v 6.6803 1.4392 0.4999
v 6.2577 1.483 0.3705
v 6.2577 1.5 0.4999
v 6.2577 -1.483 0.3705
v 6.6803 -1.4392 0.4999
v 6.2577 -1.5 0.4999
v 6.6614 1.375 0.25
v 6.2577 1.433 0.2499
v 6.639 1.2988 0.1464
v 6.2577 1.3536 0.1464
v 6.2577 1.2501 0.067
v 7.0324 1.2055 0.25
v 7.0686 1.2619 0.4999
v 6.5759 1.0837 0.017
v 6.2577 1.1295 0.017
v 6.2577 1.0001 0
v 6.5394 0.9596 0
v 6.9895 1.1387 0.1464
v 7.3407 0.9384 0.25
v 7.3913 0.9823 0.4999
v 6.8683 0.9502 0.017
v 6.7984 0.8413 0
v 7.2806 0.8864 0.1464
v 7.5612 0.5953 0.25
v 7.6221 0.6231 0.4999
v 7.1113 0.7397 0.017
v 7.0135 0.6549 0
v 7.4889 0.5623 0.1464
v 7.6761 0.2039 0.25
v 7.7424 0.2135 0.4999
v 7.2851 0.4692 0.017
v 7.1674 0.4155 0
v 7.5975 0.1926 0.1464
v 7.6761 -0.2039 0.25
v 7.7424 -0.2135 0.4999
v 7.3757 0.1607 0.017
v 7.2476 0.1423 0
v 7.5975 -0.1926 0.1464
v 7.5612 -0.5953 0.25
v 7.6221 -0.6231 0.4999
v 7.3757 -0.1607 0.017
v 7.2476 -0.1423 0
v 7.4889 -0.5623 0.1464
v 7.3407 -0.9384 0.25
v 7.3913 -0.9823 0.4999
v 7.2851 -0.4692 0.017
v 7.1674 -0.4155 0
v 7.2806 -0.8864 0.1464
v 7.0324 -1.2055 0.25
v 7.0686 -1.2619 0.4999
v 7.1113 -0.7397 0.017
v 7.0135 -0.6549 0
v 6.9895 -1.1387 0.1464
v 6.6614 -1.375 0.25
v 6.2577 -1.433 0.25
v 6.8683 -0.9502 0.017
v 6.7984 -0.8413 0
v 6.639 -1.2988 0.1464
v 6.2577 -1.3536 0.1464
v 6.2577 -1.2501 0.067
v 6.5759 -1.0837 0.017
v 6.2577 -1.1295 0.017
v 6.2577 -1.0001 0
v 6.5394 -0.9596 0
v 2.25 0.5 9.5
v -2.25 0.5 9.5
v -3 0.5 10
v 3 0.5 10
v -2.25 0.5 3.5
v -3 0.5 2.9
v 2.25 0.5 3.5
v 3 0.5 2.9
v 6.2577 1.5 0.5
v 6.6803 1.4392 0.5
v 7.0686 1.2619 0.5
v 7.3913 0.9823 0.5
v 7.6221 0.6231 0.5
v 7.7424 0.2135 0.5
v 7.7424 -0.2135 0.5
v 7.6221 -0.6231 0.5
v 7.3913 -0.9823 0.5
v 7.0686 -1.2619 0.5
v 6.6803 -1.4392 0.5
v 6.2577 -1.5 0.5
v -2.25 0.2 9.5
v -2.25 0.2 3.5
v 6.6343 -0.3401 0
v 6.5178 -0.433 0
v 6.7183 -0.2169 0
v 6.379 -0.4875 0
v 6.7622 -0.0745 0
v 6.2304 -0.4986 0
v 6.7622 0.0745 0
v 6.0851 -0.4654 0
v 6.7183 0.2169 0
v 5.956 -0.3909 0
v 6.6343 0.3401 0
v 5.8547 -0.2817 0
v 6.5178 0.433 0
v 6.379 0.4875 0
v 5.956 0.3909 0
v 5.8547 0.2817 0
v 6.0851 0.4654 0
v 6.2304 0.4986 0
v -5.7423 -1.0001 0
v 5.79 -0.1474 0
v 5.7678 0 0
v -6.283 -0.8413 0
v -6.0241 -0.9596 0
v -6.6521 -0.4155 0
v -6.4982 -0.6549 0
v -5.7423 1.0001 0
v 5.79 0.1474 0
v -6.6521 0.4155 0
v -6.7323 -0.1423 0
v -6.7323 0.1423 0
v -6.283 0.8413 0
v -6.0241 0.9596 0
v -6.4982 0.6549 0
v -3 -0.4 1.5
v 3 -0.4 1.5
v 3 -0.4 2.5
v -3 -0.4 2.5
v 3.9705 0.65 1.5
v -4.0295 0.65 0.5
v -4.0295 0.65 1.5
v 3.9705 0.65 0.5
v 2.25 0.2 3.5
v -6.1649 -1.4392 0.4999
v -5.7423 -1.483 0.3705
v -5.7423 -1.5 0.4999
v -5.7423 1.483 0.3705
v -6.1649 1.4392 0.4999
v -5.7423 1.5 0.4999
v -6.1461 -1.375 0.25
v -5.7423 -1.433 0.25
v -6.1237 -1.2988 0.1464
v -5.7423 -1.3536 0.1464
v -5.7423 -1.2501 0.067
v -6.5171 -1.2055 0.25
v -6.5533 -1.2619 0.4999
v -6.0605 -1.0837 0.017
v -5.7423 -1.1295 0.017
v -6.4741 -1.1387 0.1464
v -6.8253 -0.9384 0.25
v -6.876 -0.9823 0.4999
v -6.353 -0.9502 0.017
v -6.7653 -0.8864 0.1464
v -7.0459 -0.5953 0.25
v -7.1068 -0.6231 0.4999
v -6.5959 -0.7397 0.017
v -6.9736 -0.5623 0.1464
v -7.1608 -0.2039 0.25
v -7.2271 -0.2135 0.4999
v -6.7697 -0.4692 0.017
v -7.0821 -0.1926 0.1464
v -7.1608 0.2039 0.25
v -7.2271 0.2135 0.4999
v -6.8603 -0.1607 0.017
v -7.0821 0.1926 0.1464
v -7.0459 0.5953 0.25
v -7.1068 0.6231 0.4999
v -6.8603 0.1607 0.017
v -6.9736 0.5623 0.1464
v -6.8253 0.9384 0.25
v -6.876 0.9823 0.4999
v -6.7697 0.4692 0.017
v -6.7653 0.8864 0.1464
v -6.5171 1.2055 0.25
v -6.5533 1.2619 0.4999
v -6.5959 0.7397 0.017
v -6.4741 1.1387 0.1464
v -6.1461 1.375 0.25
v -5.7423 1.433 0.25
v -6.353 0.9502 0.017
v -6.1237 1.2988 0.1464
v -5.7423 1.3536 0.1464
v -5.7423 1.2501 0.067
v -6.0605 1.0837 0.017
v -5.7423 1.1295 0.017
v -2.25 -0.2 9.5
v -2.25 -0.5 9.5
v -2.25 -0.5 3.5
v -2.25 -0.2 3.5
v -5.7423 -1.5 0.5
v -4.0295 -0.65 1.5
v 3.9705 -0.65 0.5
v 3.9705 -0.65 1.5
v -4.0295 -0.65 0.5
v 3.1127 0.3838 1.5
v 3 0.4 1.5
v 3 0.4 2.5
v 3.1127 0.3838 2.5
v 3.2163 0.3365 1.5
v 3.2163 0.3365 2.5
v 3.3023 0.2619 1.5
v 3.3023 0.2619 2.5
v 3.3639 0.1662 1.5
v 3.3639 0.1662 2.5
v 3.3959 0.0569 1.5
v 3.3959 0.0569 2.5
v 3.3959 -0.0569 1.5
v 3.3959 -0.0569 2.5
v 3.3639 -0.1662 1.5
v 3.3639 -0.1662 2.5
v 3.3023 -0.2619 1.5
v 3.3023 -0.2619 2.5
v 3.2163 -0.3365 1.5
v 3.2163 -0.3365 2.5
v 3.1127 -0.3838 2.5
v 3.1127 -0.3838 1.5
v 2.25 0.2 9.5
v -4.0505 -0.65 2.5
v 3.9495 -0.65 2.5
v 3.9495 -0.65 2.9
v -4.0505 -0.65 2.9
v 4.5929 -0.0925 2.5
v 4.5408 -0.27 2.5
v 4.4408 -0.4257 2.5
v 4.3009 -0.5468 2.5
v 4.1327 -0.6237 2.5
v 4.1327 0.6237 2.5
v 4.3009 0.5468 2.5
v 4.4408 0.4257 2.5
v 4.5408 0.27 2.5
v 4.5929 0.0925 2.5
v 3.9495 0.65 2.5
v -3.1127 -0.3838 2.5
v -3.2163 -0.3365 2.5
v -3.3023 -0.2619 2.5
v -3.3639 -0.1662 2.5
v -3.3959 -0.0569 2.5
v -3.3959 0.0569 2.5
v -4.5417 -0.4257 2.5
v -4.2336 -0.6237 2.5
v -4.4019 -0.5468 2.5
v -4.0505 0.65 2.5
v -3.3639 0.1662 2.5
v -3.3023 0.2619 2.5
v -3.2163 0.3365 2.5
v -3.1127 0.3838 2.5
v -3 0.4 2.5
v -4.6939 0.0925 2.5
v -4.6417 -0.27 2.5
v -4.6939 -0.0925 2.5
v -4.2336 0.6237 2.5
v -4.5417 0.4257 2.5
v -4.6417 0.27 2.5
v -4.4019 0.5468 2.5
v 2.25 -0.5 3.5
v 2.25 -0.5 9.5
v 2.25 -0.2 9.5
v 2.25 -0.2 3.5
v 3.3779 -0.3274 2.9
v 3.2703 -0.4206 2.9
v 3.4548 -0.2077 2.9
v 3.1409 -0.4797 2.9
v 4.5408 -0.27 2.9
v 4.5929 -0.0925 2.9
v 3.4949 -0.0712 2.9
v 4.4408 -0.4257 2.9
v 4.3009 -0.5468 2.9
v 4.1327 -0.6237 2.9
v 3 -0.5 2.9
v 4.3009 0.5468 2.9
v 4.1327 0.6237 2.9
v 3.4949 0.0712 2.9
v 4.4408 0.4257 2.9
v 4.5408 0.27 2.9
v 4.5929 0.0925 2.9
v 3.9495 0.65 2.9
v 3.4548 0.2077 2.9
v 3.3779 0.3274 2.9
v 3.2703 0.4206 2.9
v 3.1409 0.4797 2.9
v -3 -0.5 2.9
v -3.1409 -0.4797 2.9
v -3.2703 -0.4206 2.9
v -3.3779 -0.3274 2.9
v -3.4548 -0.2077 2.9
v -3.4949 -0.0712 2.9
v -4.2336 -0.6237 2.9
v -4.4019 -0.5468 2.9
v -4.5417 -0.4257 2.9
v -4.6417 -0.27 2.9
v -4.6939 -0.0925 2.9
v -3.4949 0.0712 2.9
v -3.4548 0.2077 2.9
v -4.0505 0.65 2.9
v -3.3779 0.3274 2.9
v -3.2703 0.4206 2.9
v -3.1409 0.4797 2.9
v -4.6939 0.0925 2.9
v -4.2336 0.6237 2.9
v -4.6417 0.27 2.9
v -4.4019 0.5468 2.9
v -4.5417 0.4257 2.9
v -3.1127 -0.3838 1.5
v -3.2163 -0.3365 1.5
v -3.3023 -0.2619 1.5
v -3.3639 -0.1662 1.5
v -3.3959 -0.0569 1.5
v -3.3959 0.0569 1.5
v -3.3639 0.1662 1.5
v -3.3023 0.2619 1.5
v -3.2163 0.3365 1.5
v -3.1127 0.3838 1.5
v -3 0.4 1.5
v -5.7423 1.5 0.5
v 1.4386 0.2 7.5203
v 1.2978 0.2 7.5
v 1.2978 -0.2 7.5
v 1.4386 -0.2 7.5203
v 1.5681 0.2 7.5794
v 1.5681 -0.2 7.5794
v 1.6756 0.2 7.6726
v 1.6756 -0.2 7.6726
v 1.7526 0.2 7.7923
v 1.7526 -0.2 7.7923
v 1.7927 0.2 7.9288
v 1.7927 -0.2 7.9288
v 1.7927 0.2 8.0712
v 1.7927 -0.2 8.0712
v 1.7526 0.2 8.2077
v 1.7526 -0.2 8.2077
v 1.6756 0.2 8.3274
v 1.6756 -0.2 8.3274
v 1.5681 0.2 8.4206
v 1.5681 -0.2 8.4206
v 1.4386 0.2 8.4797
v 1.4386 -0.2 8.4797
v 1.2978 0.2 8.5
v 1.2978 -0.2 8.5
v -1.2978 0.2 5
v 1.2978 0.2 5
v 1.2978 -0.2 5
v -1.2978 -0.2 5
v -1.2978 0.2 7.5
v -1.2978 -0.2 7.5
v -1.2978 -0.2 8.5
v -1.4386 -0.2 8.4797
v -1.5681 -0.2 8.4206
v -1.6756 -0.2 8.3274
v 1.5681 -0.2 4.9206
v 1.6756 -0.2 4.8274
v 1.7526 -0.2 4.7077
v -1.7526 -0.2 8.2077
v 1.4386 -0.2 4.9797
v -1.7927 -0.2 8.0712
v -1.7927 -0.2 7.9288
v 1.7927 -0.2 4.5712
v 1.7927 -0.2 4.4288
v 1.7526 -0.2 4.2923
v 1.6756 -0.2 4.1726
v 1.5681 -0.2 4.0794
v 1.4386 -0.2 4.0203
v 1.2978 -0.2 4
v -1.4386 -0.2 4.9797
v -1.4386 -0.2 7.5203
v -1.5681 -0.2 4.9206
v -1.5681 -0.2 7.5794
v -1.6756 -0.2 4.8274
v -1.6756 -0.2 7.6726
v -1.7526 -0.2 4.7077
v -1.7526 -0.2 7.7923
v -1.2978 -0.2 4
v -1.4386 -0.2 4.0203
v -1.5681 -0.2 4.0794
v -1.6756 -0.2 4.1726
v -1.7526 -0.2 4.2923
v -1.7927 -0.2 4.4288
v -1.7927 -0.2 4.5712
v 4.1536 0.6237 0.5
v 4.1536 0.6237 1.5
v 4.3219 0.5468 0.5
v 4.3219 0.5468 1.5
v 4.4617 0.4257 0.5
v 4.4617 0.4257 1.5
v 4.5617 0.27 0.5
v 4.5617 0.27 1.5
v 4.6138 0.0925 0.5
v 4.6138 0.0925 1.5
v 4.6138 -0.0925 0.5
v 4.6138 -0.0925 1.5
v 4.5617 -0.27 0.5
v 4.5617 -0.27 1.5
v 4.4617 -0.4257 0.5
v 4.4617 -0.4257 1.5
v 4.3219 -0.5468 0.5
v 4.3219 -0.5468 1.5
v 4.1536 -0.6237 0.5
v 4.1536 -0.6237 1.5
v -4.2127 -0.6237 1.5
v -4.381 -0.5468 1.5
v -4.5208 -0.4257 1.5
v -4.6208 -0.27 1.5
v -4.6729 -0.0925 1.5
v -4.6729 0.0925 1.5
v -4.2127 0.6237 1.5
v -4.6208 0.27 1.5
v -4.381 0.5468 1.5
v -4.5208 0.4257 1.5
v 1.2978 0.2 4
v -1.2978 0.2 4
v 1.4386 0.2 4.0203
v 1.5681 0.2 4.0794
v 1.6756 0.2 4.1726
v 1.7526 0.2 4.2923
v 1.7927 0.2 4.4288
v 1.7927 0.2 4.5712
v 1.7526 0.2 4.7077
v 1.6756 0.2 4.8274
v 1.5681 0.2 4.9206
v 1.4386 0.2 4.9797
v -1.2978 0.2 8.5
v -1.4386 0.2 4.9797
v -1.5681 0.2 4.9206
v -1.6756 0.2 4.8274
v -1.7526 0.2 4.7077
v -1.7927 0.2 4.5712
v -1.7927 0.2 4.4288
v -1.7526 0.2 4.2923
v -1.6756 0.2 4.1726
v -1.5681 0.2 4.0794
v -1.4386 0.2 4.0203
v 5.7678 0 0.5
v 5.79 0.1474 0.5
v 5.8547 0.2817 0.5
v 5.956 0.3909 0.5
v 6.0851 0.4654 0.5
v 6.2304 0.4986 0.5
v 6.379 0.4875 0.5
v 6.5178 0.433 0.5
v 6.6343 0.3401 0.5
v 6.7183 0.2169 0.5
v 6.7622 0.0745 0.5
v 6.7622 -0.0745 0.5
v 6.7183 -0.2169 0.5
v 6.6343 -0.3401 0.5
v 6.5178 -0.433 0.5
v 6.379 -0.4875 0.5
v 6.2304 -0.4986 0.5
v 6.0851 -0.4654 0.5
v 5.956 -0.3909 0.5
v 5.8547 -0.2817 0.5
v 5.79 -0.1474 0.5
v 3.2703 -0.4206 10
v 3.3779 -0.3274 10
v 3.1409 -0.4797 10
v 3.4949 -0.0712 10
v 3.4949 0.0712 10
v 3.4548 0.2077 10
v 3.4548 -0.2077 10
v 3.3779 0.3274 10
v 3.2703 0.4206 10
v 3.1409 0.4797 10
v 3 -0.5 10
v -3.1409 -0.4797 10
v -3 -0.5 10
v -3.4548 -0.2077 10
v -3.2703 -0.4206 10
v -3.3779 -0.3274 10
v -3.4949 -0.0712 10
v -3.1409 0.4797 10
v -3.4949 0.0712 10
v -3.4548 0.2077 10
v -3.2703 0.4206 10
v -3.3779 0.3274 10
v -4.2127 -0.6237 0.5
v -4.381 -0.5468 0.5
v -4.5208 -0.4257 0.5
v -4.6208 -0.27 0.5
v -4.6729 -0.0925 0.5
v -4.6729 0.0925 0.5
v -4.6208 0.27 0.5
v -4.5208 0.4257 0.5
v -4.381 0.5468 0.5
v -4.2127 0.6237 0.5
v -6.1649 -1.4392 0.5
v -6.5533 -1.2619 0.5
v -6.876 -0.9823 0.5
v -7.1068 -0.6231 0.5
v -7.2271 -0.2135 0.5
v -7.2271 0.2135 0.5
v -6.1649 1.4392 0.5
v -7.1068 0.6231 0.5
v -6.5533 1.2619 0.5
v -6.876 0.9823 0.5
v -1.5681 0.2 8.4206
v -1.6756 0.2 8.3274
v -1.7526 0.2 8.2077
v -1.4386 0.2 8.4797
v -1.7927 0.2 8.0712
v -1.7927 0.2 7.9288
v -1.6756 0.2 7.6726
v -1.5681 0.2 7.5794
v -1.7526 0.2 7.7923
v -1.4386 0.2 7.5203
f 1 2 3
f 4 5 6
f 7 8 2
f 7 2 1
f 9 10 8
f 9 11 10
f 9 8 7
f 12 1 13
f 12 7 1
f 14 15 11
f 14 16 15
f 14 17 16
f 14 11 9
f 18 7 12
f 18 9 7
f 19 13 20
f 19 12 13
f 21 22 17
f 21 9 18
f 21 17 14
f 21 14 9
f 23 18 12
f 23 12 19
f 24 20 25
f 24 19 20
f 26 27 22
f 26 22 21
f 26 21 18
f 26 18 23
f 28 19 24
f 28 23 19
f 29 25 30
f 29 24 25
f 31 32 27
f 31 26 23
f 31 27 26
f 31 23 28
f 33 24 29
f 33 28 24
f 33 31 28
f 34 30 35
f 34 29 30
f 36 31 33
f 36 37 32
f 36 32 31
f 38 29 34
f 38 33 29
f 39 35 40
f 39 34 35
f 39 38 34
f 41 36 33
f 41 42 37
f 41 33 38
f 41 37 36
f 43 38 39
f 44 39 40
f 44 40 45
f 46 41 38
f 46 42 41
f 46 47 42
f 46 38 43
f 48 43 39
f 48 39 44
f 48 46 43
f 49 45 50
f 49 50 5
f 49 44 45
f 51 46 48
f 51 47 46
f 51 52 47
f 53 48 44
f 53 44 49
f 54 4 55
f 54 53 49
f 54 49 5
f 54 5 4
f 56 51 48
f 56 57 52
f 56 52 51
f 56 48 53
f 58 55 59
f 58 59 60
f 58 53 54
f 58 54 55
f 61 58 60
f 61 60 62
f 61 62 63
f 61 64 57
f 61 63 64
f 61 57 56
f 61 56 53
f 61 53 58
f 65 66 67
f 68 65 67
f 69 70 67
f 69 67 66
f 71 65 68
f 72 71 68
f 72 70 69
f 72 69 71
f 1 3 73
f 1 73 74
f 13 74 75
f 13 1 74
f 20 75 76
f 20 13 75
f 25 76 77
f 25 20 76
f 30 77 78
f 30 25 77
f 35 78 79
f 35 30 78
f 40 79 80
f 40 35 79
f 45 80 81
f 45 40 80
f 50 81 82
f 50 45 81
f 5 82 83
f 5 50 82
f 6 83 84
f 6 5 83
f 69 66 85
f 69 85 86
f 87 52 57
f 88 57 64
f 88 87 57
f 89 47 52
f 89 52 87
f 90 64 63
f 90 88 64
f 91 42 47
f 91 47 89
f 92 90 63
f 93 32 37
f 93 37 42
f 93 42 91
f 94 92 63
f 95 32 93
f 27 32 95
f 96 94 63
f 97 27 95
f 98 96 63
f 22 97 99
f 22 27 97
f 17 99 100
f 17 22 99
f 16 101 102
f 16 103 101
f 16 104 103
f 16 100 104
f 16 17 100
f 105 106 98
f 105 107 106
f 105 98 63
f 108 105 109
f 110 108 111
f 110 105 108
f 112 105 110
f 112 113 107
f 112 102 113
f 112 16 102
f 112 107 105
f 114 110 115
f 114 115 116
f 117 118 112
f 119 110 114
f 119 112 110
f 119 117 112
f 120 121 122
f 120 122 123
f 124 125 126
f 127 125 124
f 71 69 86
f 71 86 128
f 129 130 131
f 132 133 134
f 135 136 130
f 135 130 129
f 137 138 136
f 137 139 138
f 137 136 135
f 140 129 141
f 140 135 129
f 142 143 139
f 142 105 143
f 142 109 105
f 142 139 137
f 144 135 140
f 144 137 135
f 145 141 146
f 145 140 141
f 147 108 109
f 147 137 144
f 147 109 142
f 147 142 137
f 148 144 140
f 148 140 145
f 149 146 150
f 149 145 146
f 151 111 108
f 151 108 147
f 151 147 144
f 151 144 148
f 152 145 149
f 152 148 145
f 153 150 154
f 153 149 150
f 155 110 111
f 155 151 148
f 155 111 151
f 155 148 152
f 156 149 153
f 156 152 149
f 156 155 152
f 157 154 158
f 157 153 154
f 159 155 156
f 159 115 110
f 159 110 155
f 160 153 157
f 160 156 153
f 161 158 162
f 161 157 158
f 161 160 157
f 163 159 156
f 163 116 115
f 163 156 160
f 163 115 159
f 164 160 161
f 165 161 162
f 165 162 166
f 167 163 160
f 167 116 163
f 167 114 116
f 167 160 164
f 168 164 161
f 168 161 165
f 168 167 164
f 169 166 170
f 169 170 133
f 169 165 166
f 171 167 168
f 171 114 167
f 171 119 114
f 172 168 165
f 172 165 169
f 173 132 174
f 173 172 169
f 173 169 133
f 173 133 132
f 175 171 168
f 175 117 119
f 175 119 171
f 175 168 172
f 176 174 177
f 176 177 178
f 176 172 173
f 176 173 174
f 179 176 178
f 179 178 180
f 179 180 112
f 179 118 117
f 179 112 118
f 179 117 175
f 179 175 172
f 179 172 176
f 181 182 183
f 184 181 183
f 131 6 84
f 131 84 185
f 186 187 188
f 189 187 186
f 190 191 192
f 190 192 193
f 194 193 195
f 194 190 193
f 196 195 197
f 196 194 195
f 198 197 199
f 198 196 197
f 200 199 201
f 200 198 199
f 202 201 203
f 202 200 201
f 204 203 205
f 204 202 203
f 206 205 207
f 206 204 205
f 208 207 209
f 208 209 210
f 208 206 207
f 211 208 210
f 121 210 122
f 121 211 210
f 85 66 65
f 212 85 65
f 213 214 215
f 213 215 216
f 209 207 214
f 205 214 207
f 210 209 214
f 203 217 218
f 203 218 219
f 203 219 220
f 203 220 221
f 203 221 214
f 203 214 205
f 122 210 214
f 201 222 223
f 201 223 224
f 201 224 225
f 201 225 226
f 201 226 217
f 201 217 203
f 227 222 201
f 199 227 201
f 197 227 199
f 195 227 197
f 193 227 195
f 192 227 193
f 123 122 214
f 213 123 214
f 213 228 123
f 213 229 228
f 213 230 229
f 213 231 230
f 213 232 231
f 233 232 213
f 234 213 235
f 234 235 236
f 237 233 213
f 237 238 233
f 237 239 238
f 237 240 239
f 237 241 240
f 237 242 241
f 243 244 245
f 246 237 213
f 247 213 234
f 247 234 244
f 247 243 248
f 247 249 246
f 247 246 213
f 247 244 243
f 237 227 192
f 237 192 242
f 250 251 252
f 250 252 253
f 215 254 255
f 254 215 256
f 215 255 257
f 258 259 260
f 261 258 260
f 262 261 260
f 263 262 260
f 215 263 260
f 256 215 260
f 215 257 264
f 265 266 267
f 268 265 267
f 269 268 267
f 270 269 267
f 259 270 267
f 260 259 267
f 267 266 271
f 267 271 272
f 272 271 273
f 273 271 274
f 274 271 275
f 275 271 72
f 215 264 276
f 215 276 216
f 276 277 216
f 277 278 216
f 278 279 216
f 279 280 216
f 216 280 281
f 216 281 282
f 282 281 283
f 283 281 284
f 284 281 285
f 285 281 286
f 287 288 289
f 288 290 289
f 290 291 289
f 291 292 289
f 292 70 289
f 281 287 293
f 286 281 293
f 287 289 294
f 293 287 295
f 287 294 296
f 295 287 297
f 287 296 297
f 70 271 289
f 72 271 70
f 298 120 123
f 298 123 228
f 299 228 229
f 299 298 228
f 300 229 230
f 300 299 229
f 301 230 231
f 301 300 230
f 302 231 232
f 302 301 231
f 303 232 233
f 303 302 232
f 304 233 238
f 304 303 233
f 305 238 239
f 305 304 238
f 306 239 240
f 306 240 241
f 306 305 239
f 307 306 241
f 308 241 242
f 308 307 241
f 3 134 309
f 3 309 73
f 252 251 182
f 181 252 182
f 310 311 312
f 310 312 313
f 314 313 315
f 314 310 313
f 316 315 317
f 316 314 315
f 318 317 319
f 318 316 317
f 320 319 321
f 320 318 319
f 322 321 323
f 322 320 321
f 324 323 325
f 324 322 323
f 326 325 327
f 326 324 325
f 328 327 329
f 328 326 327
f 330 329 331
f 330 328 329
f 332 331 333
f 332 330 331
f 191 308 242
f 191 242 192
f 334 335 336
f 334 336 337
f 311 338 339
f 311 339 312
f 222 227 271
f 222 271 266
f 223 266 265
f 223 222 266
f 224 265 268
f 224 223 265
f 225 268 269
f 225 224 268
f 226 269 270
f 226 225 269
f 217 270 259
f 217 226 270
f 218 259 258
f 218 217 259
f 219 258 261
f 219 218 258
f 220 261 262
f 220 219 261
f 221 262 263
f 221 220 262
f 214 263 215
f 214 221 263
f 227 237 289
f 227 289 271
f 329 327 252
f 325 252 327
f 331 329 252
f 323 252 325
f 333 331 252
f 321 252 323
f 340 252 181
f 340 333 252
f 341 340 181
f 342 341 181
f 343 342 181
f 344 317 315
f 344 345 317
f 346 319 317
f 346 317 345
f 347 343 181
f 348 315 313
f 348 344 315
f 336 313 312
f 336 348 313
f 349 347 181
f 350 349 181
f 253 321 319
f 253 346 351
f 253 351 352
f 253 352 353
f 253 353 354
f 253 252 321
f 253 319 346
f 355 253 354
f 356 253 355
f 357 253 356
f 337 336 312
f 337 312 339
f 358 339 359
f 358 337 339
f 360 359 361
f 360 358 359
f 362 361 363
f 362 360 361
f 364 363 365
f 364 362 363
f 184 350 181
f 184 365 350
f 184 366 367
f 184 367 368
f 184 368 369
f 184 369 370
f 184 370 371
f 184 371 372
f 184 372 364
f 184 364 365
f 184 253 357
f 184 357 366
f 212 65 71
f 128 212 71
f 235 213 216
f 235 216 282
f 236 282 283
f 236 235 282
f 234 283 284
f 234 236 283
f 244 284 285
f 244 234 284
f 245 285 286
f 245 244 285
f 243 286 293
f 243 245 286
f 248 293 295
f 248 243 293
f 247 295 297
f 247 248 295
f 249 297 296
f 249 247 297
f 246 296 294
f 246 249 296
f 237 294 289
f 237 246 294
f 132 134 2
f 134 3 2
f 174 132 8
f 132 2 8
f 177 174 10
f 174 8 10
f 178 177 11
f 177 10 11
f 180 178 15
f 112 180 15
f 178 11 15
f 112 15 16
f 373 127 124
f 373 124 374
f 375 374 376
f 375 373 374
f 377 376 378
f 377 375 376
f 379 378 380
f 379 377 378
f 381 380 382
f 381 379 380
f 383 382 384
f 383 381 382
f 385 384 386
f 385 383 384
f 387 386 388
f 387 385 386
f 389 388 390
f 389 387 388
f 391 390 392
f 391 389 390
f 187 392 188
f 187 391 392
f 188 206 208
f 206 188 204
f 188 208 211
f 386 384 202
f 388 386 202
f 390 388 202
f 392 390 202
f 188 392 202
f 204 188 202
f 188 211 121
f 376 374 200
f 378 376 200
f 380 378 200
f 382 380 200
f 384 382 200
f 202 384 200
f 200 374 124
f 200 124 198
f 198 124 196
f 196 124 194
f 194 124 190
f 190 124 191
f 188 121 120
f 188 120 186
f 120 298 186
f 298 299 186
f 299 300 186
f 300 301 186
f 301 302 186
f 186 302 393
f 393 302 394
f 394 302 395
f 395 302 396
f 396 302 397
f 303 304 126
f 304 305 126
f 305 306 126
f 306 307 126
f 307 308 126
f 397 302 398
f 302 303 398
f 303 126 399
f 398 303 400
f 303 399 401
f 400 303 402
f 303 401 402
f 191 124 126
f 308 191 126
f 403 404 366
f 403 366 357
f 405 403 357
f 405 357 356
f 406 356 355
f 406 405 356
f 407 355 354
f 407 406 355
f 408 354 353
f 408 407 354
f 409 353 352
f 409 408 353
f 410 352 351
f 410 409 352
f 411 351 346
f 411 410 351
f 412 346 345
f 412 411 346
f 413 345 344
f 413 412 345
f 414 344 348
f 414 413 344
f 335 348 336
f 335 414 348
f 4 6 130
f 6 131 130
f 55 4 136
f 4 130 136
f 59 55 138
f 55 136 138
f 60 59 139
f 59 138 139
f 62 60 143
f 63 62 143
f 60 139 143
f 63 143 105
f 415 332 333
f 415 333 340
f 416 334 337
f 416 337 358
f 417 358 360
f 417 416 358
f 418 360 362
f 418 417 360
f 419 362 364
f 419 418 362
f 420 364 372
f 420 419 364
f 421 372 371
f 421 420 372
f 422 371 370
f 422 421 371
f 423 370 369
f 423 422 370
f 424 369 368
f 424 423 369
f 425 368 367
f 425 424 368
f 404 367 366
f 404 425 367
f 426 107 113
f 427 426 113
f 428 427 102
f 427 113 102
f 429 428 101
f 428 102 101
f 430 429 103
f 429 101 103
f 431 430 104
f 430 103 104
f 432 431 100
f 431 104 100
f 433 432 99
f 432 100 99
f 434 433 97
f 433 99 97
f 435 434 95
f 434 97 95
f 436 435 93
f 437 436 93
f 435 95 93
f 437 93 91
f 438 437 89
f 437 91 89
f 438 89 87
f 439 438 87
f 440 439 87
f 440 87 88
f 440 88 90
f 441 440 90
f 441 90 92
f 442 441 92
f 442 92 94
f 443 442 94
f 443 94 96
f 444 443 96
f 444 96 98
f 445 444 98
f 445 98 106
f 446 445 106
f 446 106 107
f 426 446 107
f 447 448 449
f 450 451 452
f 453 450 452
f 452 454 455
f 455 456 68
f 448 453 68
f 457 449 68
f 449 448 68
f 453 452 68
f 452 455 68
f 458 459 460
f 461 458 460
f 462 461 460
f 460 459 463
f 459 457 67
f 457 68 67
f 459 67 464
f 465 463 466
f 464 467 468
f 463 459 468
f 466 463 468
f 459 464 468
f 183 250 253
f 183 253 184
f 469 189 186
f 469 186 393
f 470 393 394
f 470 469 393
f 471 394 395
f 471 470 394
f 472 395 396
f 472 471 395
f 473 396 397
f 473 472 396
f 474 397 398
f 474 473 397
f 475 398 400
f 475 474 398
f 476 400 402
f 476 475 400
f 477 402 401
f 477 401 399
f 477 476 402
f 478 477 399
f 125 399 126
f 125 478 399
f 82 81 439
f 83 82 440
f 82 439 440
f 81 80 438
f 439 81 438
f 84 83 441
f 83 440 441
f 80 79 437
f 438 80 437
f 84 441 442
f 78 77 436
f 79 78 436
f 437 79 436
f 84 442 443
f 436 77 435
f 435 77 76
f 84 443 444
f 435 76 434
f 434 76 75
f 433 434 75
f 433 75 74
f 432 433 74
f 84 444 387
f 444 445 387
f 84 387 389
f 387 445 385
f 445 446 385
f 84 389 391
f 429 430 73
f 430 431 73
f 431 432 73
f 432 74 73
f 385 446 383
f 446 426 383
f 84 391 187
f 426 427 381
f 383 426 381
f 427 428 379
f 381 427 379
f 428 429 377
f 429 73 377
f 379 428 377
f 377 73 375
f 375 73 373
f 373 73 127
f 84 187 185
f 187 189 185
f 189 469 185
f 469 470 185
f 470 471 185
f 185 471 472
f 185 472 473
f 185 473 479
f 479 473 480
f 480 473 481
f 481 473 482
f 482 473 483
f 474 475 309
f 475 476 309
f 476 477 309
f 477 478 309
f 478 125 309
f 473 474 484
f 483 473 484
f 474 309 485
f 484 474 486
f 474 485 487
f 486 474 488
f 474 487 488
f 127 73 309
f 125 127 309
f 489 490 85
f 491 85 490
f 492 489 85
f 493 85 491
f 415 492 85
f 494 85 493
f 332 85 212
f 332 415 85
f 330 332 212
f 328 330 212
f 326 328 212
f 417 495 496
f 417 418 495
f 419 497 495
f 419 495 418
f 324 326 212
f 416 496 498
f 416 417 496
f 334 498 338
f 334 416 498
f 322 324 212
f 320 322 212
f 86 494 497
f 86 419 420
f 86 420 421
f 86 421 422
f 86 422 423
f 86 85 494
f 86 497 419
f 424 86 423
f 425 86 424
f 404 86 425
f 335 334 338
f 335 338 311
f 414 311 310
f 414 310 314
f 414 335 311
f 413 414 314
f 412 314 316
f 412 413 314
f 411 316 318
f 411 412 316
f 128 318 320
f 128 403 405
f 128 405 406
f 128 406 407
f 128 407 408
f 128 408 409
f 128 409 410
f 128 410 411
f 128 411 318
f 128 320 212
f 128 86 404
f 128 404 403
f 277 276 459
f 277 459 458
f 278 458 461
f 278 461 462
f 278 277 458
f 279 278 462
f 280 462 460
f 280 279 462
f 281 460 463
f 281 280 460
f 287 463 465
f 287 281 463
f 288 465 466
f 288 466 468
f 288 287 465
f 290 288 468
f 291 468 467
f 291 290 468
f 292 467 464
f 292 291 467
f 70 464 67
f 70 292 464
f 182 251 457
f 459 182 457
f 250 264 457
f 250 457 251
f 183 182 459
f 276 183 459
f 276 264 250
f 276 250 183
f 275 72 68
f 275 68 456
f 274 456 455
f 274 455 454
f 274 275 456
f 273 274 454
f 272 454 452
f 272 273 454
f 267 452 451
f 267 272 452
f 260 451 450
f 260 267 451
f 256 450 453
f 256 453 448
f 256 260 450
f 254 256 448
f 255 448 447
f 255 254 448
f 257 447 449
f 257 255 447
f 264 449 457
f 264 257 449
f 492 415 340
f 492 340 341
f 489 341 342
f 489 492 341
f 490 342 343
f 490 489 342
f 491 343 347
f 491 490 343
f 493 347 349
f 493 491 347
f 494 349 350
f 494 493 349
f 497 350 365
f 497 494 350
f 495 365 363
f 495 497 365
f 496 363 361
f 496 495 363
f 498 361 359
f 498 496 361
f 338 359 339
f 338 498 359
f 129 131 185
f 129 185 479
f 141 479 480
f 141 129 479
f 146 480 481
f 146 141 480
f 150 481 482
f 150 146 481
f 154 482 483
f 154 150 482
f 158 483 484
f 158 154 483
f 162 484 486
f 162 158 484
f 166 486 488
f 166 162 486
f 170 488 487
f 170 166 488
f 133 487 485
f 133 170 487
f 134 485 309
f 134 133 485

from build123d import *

# Parameters (mm, degrees)
EXTRUDE_2_DEPTH     = 0.5
SKETCH_6_R          = 0.5
CUT_EXTRUDE_1_DEPTH = 8.917160087
EXTRUDE_3_DEPTH     = 1
EXTRUDE_4_DEPTH     = 1
EXTRUDE_5_DEPTH     = 0.4
EXTRUDE_6_DEPTH     = 7.1
SKETCH_11_W         = 4.5
SKETCH_11_H         = 6
CUT_EXTRUDE_2_DEPTH = 0.3
SKETCH_13_W         = 4.5
SKETCH_13_H         = 6
CUT_EXTRUDE_3_DEPTH = 0.3
CUT_EXTRUDE_4_DEPTH = 13.769942202
FILLET_2_R          = 0.5


with BuildPart() as part:
    # 草图5 → 凸台-拉伸2 (new body)
    with BuildSketch(Plane.XY):
        with BuildLine():
            Line((-5.742331288, 1.5), (6.257668712, 1.5))
            ThreePointArc((6.257668712, 1.5), (7.757668712, 0), (6.257668712, -1.5))
            Line((6.257668712, -1.5), (-5.742331288, -1.5))
            ThreePointArc((-5.742331288, -1.5), (-7.242331288, 0), (-5.742331288, 1.5))
        make_face()
    extrude(amount=EXTRUDE_2_DEPTH)

    # 草图6 → 切除-拉伸1 (cut, through all)
    with BuildSketch(Plane(origin=(0, 0, 0), x_dir=(-1, 0, 0), z_dir=(0, 0, -1))):
        with Locations((-6.26778509, 0)):
            Circle(SKETCH_6_R)
    extrude(amount=-CUT_EXTRUDE_1_DEPTH, mode=Mode.SUBTRACT)

    # 草图7 → 凸台-拉伸3 (add)
    with BuildSketch(Plane.XY.offset(0.5)):
        with BuildLine():
            Line((3.97045961, -0.65), (-4.02954039, -0.65))
            ThreePointArc((-4.02954039, -0.65), (-4.67954039, 0), (-4.02954039, 0.65))
            Line((-4.02954039, 0.65), (3.97045961, 0.65))
            ThreePointArc((3.97045961, 0.65), (4.62045961, 0), (3.97045961, -0.65))
        make_face()
    extrude(amount=EXTRUDE_3_DEPTH)

    # 草图8 → 凸台-拉伸4 (add)
    with BuildSketch(Plane.XY.offset(1.5)):
        with BuildLine():
            Line((3, -0.4), (-3, -0.4))
            ThreePointArc((-3, -0.4), (-3.4, 0), (-3, 0.4))
            Line((-3, 0.4), (3, 0.4))
            ThreePointArc((3, 0.4), (3.4, 0), (3, -0.4))
        make_face()
    extrude(amount=EXTRUDE_4_DEPTH)

    # 草图9 → 凸台-拉伸5 (add)
    with BuildSketch(Plane.XY.offset(2.5)):
        with BuildLine():
            Line((-4.050467807, 0.65), (3.949532193, 0.65))
            ThreePointArc((3.949532193, 0.65), (4.599532193, 0), (3.949532193, -0.65))
            Line((3.949532193, -0.65), (-4.050467807, -0.65))
            ThreePointArc((-4.050467807, -0.65), (-4.700467807, 0), (-4.050467807, 0.65))
        make_face()
    extrude(amount=EXTRUDE_5_DEPTH)

    # 草图10 → 凸台-拉伸6 (add)
    with BuildSketch(Plane.XY.offset(2.9)):
        with BuildLine():
            Line((-3, 0.5), (3, 0.5))
            ThreePointArc((3, 0.5), (3.5, 0), (3, -0.5))
            Line((3, -0.5), (-3, -0.5))
            ThreePointArc((-3, -0.5), (-3.5, 0), (-3, 0.5))
        make_face()
    extrude(amount=EXTRUDE_6_DEPTH)

    # 草图11 → 切除-拉伸2 (cut)
    with BuildSketch(Plane(origin=(0, -0.5, 0), x_dir=(-1, 0, 0), z_dir=(0, -1, 0))):
        with Locations((0, -6.5)):
            Rectangle(SKETCH_11_W, SKETCH_11_H)
    extrude(amount=-CUT_EXTRUDE_2_DEPTH, mode=Mode.SUBTRACT)

    # 草图13 → 切除-拉伸3 (cut)
    with BuildSketch(Plane(origin=(0, 0.5, 0), x_dir=(1, 0, 0), z_dir=(0, 1, 0))):
        with Locations((0, -6.5)):
            Rectangle(SKETCH_13_W, SKETCH_13_H)
    extrude(amount=-CUT_EXTRUDE_3_DEPTH, mode=Mode.SUBTRACT)

    # 草图14 → 切除-拉伸4 (cut, through all)
    with BuildSketch(Plane(origin=(0, 0.2, 0), x_dir=(1, 0, 0), z_dir=(0, 1, 0))):
        with BuildLine():
            Line((1.297759643, -5), (-1.297759643, -5))
            ThreePointArc((-1.297759643, -5), (-1.797759643, -4.5), (-1.297759643, -4))
            Line((-1.297759643, -4), (1.297759643, -4))
            ThreePointArc((1.297759643, -4), (1.797759643, -4.5), (1.297759643, -5))
        make_face()
        with BuildLine():
            Line((1.297759643, -8.5), (-1.297759643, -8.5))
            ThreePointArc((-1.297759643, -8.5), (-1.797759643, -8), (-1.297759643, -7.5))
            Line((-1.297759643, -7.5), (1.297759643, -7.5))
            ThreePointArc((1.297759643, -7.5), (1.797759643, -8), (1.297759643, -8.5))
        make_face()
    extrude(amount=-CUT_EXTRUDE_4_DEPTH, mode=Mode.SUBTRACT)

    # 圆角2
    fillet_2_edges = [part.edges().sort_by_distance(p)[0] for p in [
        (-7.242331288, 0, 0),
        (0.257668712, 1.5, 0),
        (7.757668712, 0, 0),
        (0.257668712, -1.5, 0),
    ]]
    fillet(fillet_2_edges, radius=FILLET_2_R - 0.0001)  # a hair under: the kernel refuses the full size


solid = part.part
